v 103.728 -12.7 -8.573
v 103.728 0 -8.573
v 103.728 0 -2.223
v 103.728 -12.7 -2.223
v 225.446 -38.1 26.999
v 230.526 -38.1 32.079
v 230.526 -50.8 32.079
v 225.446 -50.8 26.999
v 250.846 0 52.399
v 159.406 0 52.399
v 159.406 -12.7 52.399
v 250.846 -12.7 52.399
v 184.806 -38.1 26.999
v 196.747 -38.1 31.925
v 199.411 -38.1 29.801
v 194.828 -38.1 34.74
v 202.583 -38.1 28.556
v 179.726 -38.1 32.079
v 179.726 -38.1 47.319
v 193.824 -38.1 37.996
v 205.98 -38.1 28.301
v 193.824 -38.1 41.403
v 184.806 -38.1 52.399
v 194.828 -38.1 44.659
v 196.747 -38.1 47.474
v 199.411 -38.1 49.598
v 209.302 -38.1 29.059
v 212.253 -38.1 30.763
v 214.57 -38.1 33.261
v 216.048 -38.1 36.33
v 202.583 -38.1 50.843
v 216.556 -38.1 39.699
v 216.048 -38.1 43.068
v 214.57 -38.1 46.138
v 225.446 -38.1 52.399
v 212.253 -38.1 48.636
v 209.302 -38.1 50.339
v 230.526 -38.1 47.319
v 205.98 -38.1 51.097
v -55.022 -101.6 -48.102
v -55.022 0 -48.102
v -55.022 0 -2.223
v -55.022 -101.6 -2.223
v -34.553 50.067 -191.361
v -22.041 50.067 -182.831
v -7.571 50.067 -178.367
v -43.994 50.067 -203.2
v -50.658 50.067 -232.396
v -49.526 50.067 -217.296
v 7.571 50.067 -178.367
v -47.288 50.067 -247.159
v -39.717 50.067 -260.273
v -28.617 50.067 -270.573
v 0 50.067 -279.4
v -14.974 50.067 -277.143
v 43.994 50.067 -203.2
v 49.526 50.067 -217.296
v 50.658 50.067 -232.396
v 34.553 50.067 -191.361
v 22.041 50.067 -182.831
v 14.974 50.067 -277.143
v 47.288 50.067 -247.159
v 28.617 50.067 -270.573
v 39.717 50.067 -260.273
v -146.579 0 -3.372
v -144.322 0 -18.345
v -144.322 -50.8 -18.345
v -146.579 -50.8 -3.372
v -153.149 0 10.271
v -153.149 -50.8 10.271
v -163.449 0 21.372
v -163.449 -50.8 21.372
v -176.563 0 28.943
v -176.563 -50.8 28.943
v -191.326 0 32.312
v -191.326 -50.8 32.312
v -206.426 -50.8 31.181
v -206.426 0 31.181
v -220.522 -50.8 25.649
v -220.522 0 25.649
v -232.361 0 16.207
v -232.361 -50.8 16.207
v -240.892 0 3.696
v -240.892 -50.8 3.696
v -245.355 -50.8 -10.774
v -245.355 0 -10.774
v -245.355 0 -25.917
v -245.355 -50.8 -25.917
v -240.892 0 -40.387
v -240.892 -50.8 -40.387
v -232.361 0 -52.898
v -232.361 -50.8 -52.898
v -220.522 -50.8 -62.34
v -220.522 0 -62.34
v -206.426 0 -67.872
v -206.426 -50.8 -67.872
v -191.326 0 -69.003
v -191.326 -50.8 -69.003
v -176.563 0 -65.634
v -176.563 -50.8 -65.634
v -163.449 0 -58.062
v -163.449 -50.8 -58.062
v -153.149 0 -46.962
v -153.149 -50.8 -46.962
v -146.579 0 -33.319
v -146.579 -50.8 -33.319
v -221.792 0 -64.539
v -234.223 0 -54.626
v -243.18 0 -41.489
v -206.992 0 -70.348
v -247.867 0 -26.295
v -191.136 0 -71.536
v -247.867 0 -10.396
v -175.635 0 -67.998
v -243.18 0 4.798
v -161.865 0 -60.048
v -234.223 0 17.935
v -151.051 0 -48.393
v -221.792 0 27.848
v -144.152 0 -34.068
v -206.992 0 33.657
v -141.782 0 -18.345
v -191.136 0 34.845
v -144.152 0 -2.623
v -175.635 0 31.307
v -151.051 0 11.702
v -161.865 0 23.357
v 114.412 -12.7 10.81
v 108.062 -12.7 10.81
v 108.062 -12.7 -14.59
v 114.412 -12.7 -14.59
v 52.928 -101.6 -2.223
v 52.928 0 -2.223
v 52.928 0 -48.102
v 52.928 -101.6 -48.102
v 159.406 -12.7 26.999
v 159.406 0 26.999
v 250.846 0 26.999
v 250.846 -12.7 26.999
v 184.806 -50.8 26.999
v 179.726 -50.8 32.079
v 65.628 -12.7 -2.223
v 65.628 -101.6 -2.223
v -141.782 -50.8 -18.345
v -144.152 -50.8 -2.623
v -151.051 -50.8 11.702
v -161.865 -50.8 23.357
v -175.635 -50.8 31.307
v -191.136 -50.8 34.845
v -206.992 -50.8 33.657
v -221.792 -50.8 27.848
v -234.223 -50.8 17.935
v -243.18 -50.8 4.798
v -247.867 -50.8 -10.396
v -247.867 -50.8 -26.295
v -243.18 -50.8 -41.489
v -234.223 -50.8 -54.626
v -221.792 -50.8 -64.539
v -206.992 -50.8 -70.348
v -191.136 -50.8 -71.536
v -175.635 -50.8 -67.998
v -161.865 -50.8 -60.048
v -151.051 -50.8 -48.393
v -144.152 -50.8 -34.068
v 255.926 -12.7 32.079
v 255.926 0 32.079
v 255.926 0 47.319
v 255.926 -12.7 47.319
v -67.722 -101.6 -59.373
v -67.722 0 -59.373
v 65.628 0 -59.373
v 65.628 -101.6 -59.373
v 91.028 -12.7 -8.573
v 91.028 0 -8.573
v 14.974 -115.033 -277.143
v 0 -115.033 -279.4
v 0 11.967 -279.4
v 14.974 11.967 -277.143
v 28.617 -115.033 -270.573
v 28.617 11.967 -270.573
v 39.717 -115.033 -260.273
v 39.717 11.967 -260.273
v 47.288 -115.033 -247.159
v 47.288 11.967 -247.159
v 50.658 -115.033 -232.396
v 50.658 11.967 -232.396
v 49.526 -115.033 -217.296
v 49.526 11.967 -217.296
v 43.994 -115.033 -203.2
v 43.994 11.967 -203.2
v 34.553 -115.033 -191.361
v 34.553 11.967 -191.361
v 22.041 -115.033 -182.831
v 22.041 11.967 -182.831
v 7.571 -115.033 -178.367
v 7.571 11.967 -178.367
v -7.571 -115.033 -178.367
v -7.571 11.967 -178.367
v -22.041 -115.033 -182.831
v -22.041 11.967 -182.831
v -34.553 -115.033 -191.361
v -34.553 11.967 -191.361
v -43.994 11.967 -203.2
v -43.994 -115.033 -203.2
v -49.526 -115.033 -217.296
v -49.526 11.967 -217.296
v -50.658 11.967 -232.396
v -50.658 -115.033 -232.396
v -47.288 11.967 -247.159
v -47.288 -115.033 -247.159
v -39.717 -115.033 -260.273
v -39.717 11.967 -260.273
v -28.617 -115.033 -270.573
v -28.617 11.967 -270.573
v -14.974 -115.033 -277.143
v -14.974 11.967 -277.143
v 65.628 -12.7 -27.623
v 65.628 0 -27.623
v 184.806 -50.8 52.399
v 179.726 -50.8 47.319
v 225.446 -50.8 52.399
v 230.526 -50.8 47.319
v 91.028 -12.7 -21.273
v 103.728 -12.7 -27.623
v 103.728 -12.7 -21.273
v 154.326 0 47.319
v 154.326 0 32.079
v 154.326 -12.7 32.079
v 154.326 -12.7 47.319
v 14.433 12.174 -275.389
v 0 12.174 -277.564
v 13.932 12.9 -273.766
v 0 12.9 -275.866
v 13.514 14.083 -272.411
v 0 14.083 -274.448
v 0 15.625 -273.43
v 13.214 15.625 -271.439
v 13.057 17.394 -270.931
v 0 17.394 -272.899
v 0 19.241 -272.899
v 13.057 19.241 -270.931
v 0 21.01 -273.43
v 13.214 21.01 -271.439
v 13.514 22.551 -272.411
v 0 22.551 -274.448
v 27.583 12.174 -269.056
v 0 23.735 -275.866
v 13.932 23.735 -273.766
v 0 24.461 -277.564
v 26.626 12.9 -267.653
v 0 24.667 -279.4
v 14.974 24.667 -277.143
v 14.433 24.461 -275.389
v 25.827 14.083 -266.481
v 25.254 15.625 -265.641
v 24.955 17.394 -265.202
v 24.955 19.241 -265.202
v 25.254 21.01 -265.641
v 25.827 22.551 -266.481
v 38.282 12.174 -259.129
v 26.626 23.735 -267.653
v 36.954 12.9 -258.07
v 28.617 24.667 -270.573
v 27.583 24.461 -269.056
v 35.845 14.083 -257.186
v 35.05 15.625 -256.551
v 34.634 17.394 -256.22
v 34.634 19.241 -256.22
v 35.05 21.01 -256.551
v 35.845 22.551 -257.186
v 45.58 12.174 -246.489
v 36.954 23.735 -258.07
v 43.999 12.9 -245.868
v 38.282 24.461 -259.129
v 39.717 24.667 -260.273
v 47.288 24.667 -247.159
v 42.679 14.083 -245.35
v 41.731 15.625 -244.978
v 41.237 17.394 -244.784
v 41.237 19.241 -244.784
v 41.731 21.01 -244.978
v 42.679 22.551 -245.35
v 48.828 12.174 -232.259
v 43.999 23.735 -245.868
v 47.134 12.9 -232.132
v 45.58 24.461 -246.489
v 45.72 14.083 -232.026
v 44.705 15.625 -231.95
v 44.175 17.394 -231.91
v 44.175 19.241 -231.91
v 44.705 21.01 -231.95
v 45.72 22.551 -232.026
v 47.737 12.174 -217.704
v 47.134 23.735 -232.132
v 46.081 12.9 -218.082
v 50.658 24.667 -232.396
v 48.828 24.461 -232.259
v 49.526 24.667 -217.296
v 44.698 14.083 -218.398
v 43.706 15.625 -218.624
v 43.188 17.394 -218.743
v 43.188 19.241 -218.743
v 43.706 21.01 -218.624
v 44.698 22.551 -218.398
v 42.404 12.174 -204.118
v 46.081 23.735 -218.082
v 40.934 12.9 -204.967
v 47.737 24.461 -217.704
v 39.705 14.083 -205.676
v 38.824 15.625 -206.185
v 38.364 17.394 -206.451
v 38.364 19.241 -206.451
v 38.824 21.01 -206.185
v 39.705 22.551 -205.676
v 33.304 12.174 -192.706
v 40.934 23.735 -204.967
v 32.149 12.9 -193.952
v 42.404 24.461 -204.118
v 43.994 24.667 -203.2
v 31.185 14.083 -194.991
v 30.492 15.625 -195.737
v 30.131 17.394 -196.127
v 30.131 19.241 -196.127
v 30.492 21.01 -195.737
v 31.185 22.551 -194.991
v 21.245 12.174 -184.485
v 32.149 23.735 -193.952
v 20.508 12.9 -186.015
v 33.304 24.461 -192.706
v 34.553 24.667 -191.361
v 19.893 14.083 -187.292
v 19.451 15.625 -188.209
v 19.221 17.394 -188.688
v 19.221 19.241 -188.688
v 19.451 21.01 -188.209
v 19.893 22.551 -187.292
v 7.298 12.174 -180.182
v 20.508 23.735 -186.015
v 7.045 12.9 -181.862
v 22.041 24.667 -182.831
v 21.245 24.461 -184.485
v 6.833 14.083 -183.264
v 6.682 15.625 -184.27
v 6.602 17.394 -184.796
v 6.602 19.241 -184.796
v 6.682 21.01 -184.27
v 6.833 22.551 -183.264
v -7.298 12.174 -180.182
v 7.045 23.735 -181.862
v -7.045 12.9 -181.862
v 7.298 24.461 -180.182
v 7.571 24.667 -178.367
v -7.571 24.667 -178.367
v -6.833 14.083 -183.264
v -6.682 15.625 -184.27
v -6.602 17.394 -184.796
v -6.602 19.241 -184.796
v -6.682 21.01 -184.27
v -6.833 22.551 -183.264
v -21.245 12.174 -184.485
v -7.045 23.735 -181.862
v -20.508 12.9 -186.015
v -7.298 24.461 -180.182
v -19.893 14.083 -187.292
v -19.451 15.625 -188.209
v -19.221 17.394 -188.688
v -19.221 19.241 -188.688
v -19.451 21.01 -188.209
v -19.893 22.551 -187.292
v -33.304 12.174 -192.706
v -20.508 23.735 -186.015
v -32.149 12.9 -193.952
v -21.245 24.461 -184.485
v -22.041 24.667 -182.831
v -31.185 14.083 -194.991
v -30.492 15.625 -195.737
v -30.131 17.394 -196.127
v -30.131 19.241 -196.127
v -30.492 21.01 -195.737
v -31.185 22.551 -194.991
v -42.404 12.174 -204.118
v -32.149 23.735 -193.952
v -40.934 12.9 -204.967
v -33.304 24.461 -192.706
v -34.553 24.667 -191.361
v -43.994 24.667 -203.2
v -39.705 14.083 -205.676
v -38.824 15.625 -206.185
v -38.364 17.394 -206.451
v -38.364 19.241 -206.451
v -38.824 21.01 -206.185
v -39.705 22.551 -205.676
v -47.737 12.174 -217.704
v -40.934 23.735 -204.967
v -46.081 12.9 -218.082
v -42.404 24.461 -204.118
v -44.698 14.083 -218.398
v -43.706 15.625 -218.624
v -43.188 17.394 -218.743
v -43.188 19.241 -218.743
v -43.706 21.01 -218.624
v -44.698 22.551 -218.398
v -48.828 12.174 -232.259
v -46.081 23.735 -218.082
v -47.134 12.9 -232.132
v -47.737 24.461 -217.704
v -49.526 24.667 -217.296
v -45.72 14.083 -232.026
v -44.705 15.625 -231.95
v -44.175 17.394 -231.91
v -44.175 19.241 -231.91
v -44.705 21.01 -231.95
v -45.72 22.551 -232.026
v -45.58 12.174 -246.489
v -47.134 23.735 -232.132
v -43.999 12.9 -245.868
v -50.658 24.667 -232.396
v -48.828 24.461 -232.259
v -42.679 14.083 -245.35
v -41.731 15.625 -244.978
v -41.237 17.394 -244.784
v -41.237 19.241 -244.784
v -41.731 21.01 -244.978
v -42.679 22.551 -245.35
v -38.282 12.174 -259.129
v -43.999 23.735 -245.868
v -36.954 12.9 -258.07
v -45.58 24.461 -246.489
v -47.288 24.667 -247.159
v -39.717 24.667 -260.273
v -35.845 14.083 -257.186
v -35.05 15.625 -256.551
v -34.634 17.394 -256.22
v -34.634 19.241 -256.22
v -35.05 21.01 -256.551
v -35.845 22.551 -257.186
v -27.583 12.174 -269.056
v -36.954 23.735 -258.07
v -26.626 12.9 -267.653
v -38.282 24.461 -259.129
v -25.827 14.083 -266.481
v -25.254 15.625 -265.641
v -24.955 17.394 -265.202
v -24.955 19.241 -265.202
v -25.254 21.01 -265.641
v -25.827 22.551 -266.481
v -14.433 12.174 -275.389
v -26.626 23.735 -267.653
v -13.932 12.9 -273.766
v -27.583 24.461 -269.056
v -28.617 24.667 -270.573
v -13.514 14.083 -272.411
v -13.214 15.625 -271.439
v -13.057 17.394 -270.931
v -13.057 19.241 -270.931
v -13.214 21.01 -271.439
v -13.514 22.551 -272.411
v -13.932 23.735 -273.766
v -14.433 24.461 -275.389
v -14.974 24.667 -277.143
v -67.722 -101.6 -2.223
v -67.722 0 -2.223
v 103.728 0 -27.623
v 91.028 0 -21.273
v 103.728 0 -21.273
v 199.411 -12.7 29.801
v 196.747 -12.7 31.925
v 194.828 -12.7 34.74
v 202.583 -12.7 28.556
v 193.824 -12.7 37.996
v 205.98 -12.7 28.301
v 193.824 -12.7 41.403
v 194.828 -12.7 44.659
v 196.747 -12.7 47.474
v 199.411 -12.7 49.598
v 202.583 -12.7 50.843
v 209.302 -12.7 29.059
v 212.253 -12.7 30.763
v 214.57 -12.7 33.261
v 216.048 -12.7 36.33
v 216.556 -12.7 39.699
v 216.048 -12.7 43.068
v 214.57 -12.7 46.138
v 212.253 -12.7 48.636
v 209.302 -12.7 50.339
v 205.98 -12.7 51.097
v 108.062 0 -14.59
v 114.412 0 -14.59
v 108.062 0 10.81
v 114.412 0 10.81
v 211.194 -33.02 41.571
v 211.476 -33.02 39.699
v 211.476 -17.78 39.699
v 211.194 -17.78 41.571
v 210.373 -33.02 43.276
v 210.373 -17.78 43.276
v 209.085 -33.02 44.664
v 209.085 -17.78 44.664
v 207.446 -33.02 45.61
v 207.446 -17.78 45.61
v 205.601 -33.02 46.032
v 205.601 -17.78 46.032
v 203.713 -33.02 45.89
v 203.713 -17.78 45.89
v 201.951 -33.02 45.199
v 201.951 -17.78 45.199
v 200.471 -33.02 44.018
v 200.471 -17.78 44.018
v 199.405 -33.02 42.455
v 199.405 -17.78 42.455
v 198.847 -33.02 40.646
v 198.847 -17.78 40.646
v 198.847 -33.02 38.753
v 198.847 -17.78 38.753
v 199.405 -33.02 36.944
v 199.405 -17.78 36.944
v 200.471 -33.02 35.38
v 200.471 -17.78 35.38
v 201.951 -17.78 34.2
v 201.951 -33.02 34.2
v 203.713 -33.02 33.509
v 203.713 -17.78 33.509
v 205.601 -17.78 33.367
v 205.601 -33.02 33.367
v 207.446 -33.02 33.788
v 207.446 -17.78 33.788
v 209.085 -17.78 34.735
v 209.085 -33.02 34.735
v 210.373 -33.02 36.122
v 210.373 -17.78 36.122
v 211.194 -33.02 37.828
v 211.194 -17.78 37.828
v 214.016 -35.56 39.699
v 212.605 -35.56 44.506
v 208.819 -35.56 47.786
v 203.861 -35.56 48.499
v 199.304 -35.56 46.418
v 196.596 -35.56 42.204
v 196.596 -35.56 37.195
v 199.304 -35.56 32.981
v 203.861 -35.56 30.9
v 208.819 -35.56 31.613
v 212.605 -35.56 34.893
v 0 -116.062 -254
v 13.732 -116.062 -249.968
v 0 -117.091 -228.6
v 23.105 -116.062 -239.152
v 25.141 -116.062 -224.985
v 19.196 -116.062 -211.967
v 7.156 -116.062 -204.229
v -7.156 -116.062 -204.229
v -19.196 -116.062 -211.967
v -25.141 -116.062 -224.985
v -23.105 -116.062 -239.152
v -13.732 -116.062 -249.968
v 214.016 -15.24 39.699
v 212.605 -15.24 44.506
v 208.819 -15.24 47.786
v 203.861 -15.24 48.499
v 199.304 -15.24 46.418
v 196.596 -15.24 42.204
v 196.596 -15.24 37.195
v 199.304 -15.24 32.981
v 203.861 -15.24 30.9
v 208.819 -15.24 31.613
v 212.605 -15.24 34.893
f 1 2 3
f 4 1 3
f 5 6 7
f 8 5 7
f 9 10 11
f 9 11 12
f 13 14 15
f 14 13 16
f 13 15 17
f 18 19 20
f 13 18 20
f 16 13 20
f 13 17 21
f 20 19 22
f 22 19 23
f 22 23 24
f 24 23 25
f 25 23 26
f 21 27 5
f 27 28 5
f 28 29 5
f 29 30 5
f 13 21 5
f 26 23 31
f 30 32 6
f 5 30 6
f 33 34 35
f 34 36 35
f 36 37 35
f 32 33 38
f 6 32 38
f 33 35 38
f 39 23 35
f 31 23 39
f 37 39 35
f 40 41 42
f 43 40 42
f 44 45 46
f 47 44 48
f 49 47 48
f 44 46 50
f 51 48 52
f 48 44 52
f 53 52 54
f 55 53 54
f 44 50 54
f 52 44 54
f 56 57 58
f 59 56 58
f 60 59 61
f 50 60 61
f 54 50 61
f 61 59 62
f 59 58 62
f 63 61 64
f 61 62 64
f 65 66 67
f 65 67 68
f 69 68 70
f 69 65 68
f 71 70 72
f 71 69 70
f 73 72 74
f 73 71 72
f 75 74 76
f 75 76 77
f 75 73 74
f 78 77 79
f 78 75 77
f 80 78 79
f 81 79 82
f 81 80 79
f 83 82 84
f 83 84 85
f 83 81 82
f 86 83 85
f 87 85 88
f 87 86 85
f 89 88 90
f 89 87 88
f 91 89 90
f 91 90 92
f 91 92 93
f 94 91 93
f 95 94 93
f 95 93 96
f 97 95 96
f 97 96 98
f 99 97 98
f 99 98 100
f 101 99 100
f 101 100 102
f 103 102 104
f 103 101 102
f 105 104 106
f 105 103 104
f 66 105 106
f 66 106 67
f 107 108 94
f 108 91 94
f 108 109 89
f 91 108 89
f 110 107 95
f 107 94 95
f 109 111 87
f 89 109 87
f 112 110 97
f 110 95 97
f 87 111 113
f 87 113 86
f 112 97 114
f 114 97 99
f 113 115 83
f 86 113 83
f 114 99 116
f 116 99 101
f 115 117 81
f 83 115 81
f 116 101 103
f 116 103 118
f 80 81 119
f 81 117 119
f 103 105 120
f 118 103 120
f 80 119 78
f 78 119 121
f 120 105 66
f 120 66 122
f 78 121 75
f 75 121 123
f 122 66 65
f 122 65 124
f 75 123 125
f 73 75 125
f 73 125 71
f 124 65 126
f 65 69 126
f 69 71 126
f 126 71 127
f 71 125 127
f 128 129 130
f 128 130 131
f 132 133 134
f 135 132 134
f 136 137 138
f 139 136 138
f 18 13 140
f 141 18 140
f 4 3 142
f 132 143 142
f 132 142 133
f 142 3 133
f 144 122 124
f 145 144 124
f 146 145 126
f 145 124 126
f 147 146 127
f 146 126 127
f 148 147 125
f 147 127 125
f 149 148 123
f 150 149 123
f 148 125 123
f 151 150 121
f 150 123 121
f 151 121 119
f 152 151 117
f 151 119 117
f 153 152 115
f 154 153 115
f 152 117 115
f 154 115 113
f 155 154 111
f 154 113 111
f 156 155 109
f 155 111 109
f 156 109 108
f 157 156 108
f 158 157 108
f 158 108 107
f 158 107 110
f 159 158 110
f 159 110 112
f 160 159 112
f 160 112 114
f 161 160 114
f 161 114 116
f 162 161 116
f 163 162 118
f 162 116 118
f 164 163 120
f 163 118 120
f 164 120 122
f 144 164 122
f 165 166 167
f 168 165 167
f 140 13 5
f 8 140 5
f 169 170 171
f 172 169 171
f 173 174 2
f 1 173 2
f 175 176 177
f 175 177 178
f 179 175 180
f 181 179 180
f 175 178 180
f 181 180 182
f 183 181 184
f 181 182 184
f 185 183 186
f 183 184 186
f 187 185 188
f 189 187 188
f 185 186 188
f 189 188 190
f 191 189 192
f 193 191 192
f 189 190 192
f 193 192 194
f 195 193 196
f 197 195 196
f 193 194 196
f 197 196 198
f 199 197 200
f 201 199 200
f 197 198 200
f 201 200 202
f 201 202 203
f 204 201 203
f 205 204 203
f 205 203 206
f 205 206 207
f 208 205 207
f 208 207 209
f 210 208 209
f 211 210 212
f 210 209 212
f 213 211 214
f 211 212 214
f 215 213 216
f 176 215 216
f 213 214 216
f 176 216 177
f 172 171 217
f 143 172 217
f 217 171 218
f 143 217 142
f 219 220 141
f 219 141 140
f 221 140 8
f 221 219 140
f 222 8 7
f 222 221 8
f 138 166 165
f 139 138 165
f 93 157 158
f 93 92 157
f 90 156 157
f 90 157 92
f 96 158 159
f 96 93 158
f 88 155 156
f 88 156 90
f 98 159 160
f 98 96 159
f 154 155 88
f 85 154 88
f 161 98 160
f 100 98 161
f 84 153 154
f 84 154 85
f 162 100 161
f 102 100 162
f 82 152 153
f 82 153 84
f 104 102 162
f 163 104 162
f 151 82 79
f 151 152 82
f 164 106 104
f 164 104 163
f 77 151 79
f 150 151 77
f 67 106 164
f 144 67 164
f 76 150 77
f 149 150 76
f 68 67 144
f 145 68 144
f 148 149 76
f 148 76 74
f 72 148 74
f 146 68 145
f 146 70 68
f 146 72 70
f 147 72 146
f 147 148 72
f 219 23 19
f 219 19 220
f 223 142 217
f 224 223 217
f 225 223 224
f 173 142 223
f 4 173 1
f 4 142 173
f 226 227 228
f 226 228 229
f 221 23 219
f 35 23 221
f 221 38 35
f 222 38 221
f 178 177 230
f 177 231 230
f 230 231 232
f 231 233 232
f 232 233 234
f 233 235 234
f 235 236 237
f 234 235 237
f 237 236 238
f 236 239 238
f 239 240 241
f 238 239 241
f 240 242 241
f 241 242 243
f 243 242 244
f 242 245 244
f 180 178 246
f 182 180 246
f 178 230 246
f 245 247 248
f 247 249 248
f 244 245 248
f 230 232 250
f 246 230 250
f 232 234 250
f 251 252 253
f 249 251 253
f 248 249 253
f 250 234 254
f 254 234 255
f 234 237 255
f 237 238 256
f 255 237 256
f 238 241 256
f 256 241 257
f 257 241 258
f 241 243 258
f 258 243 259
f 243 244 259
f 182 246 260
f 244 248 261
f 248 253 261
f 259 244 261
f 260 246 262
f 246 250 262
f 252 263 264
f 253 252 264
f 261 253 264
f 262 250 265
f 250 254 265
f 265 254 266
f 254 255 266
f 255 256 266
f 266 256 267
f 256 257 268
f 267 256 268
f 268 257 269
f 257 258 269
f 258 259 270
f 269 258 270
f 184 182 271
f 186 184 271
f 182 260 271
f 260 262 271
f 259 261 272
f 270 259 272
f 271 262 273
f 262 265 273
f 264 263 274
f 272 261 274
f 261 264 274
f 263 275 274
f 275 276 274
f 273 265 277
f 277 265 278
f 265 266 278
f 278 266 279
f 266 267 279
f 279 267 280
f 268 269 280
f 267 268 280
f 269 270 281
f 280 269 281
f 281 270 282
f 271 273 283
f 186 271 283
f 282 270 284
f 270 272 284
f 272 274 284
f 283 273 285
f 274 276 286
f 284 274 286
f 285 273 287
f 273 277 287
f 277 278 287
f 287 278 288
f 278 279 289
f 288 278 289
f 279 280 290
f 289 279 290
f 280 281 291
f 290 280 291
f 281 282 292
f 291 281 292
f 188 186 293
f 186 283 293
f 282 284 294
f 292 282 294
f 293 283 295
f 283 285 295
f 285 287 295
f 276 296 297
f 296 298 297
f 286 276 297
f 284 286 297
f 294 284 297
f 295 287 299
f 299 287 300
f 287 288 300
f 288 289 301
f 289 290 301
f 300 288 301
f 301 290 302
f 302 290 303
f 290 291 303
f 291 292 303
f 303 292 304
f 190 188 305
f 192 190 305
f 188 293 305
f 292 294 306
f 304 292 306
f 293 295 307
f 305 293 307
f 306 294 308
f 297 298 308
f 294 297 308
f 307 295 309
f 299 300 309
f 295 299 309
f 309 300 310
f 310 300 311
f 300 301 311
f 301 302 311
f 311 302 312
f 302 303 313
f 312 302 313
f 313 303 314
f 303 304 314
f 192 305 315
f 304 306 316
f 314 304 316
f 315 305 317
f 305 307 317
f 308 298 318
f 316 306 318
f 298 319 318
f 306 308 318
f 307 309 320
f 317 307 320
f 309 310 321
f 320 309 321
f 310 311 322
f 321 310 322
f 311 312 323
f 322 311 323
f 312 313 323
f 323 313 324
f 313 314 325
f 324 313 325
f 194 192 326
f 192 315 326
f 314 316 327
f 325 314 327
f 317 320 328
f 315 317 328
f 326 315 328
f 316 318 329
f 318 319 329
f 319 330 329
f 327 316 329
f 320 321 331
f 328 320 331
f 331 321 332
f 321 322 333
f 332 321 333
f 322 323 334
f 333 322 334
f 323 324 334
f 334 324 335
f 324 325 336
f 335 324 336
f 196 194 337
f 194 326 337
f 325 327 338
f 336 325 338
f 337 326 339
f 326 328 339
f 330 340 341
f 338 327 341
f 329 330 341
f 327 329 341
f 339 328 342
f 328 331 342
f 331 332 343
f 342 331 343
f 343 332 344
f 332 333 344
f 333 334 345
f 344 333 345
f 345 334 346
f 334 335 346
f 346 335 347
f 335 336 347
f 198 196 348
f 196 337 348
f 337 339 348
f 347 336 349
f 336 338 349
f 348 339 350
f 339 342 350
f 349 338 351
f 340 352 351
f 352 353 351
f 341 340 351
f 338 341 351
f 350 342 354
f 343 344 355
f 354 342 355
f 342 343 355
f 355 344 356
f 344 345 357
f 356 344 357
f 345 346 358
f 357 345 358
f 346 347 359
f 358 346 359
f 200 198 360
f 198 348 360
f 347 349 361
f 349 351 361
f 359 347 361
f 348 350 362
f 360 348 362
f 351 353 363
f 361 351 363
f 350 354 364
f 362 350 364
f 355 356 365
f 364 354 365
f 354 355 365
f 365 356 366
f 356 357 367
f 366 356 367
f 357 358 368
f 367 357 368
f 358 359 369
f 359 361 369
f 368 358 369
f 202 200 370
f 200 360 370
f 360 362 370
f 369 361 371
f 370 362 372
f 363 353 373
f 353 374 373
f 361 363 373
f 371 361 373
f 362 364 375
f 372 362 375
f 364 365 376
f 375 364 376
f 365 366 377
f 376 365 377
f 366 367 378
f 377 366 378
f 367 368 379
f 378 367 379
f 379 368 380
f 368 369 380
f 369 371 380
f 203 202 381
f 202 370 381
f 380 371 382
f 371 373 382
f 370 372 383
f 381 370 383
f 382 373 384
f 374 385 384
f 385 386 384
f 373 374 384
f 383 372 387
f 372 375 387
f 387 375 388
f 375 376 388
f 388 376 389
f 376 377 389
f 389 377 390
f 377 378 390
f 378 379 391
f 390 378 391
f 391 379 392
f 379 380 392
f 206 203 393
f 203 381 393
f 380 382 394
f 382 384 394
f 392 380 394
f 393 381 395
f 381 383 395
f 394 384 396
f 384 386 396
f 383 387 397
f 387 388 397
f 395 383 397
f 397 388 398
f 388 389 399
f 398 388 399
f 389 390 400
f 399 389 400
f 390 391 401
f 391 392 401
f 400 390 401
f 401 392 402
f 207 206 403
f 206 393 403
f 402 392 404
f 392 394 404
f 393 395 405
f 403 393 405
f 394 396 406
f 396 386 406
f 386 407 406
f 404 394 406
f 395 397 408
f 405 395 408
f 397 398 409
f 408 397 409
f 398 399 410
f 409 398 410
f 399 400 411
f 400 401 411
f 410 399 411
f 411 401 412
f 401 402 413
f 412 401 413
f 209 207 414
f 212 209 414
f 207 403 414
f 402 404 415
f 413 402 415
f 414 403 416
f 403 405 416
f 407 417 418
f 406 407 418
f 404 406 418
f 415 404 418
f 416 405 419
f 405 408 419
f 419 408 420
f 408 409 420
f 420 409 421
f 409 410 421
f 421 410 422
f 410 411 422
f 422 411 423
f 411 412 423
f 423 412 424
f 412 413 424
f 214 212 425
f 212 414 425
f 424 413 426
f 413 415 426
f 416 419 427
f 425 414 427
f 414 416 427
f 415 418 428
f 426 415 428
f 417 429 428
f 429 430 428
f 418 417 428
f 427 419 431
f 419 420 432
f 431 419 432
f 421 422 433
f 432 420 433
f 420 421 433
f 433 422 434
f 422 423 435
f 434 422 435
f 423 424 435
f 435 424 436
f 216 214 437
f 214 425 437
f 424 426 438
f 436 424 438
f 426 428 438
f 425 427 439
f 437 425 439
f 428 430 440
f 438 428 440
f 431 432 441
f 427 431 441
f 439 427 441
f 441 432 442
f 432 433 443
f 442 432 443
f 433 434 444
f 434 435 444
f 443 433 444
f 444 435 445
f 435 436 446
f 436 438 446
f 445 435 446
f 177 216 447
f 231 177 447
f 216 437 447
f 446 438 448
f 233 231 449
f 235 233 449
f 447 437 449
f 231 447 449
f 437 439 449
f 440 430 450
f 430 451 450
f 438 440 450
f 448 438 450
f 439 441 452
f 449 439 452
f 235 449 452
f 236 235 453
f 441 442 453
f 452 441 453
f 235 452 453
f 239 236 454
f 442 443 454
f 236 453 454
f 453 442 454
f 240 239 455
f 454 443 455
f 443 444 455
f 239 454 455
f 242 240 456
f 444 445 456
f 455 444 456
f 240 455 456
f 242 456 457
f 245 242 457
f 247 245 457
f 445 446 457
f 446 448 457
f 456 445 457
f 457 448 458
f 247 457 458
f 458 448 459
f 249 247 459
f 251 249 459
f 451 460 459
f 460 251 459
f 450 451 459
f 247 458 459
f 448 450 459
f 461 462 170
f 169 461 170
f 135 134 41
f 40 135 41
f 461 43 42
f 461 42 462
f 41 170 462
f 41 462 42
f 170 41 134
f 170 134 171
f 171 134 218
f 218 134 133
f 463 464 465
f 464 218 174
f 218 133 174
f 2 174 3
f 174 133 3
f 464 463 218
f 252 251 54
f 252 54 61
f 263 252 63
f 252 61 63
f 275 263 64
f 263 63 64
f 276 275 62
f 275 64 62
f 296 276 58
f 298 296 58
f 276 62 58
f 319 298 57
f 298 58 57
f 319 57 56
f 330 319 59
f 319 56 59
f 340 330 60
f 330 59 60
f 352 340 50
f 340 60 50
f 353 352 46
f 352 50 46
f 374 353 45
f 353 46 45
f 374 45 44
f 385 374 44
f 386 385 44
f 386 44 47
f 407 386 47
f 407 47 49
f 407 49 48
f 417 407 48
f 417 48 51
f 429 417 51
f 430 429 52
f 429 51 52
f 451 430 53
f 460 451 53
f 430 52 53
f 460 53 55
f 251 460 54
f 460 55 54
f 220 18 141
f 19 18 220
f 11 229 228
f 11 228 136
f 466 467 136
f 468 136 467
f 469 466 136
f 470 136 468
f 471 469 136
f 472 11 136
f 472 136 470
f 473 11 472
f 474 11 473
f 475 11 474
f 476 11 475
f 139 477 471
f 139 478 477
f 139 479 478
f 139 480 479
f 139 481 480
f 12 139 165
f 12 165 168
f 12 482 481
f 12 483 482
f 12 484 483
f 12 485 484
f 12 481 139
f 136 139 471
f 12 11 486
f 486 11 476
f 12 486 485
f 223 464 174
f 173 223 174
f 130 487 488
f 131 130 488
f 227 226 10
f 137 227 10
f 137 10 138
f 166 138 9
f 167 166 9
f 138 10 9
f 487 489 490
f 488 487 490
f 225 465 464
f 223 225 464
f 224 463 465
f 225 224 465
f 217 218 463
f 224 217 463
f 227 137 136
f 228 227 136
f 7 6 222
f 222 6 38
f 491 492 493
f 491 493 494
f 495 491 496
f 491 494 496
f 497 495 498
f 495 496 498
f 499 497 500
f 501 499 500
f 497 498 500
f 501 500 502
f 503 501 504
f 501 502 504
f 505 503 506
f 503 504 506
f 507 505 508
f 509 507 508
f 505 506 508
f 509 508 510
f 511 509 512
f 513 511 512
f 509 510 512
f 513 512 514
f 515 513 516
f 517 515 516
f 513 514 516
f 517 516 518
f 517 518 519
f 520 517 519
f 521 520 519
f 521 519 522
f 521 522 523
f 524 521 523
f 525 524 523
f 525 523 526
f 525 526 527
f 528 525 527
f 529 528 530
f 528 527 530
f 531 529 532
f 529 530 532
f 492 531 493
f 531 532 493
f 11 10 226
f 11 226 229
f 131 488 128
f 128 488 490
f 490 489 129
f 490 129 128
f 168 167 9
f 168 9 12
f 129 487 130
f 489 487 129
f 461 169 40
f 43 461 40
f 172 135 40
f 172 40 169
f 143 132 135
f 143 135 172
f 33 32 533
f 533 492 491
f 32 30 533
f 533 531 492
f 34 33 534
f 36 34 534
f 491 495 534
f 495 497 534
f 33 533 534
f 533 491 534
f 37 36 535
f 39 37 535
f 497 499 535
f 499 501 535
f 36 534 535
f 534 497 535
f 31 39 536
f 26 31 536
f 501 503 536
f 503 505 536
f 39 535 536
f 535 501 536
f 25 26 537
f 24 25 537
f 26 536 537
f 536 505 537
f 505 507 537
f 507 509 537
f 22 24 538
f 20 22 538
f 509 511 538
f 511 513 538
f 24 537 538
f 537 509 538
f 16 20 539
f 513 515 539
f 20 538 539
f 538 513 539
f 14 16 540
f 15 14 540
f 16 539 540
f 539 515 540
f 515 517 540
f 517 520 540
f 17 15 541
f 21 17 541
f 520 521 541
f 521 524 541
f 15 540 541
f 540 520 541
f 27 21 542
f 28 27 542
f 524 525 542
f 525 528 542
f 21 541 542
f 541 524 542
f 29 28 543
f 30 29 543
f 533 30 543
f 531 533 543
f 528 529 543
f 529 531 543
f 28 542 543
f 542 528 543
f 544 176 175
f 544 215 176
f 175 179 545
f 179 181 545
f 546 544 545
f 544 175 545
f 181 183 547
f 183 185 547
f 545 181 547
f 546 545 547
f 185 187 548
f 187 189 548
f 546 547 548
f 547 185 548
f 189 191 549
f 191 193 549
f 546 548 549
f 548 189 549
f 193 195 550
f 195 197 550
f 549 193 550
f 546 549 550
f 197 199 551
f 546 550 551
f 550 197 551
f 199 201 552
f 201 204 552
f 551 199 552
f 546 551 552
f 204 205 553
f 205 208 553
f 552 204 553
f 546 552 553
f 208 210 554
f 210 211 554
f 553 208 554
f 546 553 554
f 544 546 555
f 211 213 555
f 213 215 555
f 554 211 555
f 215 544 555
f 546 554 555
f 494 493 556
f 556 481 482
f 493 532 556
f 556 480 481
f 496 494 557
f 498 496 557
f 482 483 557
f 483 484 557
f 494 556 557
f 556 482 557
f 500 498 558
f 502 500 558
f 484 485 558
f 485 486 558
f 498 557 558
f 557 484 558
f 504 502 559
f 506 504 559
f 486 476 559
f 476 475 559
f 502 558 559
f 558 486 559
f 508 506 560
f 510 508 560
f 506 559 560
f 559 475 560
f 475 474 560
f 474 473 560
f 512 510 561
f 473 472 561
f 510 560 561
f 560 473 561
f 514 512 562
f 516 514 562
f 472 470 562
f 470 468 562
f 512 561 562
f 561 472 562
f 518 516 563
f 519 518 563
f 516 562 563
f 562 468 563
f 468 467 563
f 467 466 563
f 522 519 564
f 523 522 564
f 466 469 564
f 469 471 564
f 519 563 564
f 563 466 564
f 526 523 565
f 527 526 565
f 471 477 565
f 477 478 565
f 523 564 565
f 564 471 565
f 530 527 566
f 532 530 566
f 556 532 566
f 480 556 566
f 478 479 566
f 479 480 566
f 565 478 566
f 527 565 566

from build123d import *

# Parameters (mm, degrees)
F1_DEPTH  = 101.6
F2_R      = 53.34
F2_R_2    = 50.8
F3_DEPTH  = 50.8
F4_W      = 101.6
F4_H      = 25.4
F5_DEPTH  = 12.7
F6_R      = 6.35
F7_DEPTH  = 25.4
F8_W      = 50.8
F8_H      = 25.4
F9_DEPTH  = 12.7
F10_SIZE  = 5.08
F11_DEPTH = 12.7
F12_W     = 6.35
F12_H     = 25.4
F13_DEPTH = 12.7


with BuildPart() as f1:
    # F0 (on Front) → F1 (new body)
    with BuildSketch(Plane.XZ):
        Polygon((-55.021855, -48.101832), (-55.021855, -2.223082), (-67.721855, -2.223082), (-67.721855, -59.373082), (65.628145, -59.373082), (65.628145, -27.623082), (65.628145, -2.223082), (52.928145, -2.223082), (52.928145, -48.101832), align=None)
    extrude(amount=F1_DEPTH)

    # F0 (on Front) → F11 (join)
    with BuildSketch(Plane.XZ):
        Polygon((103.728145, -2.223082), (65.628145, -2.223082), (65.628145, -27.623082), (103.728145, -27.623082), (103.728145, -21.273082), (91.028145, -21.273082), (91.028145, -8.573082), (103.728145, -8.573082), align=None)
    extrude(amount=F11_DEPTH)


with BuildPart() as f3:
    # F2 (on Front) → F3 (new body)
    with BuildSketch(Plane.XZ):
        with Locations((-195.122302, -18.345457)):
            Circle(F2_R)
        with Locations((-195.122302, -18.345457)):
            Circle(F2_R_2, mode=Mode.SUBTRACT)
    extrude(amount=F3_DEPTH)


with BuildPart() as f5:
    # F4 (on Front) → F5 (new body)
    with BuildSketch(Plane.XZ):
        with Locations((205.126122, 39.699358)):
            Rectangle(F4_W, F4_H)
    extrude(amount=F5_DEPTH)

    # F6 (on face) → F7 (join)
    with BuildSketch(Plane.XZ.offset(12.7)):
        with Locations((205.126122, 39.699358)):
            Circle(F6_R)
    extrude(amount=F7_DEPTH)

    # F8 (on face) → F9 (join)
    with BuildSketch(Plane.XZ.offset(38.1)):
        with Locations((205.126122, 39.699358)):
            Rectangle(F8_W, F8_H)
    extrude(amount=F9_DEPTH)

    # F10
    f10_edges = [f5.edges().sort_by_distance(p)[0] for p in [
        (154.326122, -6.35, 52.399358),
        (154.326122, -6.35, 26.999358),
        (179.726122, -44.45, 26.999358),
        (179.726122, -44.45, 52.399358),
        (230.526122, -44.45, 52.399358),
        (255.926122, -6.35, 52.399358),
        (255.926122, -6.35, 26.999358),
        (230.526122, -44.45, 26.999358),
        (198.776122, -12.7, 39.699358),
        (198.776122, -38.1, 39.699358),
    ]]
    chamfer(f10_edges, length=F10_SIZE)


with BuildPart() as f13:
    # F12 (on Front) → F13 (new body)
    with BuildSketch(Plane.XZ):
        with Locations((111.236603, -1.890229)):
            Rectangle(F12_W, F12_H)
    extrude(amount=F13_DEPTH)


with BuildPart() as f15:
    # F14 (on Right) → F15 (revolve)
    with BuildSketch(Plane.YZ):
        with BuildLine():
            Line((-117.091149, -228.6), (-115.032727, -279.4))
            Line((-115.032727, -279.4), (11.967273, -279.4))
            ThreePointArc((11.967273, -279.4), (18.317273, -272.831512), (24.667273, -279.4))
            Line((24.667273, -279.4), (50.067273, -279.4))
            Line((50.067273, -279.4), (50.067273, -228.6))
            Line((50.067273, -228.6), (-117.091149, -228.6))
        make_face()
    revolve(axis=Axis((0, -33.511938, -228.6), (0, -1, 0)))


solid = Compound([f1.part, f3.part, f5.part, f13.part, f15.part])
